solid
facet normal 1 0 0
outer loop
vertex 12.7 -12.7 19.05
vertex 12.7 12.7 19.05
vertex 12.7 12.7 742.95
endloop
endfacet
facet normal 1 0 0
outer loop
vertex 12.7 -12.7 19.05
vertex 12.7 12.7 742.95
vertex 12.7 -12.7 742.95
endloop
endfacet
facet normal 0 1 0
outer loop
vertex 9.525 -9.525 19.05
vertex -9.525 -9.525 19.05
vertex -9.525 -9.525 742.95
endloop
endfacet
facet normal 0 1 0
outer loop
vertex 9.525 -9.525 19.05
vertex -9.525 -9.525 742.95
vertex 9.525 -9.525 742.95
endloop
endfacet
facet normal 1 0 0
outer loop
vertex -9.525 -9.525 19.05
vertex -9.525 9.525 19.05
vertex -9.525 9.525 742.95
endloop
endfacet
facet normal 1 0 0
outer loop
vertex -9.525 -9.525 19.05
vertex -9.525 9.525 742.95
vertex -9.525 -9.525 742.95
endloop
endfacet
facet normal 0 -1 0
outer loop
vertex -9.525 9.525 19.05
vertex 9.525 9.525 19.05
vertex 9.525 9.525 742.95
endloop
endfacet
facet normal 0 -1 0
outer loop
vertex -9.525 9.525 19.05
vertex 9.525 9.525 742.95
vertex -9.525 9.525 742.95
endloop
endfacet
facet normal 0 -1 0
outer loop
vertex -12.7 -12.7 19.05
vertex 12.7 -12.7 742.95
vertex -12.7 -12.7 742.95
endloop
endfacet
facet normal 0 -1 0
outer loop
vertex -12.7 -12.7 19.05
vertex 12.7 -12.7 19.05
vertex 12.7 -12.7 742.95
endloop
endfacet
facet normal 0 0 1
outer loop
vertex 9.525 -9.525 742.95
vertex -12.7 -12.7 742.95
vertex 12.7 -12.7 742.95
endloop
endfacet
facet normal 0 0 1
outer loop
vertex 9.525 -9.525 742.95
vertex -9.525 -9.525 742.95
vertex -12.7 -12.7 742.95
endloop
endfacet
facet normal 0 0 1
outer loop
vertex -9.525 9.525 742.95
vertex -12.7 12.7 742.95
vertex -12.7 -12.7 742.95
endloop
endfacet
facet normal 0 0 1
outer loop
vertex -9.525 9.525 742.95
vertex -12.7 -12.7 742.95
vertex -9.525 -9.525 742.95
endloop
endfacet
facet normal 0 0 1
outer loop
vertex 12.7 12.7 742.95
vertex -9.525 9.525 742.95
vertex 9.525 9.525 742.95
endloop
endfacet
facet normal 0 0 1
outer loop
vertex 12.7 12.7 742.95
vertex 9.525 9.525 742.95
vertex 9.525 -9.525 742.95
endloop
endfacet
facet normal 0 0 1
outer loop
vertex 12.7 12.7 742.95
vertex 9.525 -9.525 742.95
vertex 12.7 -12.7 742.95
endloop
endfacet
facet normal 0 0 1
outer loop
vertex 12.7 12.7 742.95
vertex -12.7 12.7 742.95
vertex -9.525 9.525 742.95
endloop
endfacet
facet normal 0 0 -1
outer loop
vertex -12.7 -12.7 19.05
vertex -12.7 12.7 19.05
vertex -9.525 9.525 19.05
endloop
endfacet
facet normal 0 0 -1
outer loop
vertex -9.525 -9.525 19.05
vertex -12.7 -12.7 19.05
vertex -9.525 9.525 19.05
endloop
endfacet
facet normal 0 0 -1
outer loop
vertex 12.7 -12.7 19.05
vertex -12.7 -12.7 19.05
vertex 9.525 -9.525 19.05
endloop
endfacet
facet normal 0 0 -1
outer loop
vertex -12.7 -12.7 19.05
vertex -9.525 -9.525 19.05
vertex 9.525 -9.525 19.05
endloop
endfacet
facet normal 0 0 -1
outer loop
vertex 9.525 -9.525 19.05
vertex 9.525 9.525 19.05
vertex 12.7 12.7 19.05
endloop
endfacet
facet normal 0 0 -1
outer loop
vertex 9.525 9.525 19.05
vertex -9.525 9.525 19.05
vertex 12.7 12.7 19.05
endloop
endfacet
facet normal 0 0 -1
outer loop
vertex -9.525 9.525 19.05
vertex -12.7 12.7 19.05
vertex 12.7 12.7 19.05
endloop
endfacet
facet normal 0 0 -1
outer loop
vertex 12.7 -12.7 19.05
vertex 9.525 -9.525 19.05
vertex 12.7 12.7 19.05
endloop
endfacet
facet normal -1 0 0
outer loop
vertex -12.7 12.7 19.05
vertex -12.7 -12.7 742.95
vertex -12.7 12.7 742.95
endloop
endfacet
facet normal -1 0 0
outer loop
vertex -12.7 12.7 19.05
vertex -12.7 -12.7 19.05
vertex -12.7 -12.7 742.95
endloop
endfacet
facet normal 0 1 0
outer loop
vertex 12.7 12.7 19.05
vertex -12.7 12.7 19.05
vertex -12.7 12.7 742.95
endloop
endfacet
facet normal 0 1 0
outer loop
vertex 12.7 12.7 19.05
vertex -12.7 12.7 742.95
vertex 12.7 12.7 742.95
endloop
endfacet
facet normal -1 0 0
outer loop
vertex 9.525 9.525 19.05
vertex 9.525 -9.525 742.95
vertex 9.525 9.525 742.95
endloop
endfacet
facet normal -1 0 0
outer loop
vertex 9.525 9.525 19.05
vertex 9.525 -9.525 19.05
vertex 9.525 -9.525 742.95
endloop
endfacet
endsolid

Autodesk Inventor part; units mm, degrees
ref_plane "Start Plane" through (0, 0, 19.05) normal (0, 0, 1) x (1, 0, 0)
ref_plane "End Plane" through (0, 0, 742.95) normal (0, 0, 1) x (1, 0, 0)
sketch "Sketch" plane through (0, 0, 0) normal (0, 0, 1) x (1, 0, 0)
  line L0 (-12.7, 12.7) -> (12.7, 12.7)
  line L1 (12.7, 12.7) -> (12.7, -12.7)
  line L2 (12.7, -12.7) -> (-12.7, -12.7)
  line L3 (-12.7, -12.7) -> (-12.7, 12.7)
  line L4 (9.525, 9.525) -> (-9.525, 9.525)
  line L5 (-9.525, 9.525) -> (-9.525, -9.525)
  line L6 (-9.525, -9.525) -> (9.525, -9.525)
  line L7 (9.525, -9.525) -> (9.525, 9.525)
  point P0 (0, 0)
  point P1 (0, 12.7)
  point P2 (-12.7, 0)
  dimension "width" = 25.4
  dimension "d1" = 3.175
extrude "Body" add sketch "Sketch" along normal up to surface (723.9 mm away) from surface at 19.05
sketch "Sketch4" plane through (0, 0, 0) normal (0, 0, 1) x (1, 0, 0)
  line L0 (0, 0) -> (10, 0)
ref_plane "Work Plane4" through (0, 0, 0) normal (0, -1, 0) x (1, 0, 0)
sketch "Sketch5" plane through (0, 0, 0) normal (0, -1, 0) x (1, 0, 0)
  line L0 (-2, 19.05) -> (12, 19.05)
  line L1 (-2, 742.95) -> (12, 742.95)
  dimension "d9" = 723.9
ref_plane "Work Plane5" through (19.05, 76.2, 742.95) normal (0, 0, 1) x (1, 0, 0)
split "Split1" plane through (19.05, 76.2, 742.95) removes the side toward (0, 0, 1)
ref_plane "Work Plane6" through (-19.05, 76.2, 19.05) normal (0, 0, -1) x (-1, 0, 0)
split "Split2" plane through (-19.05, 76.2, 19.05) removes the side toward (0, 0, -1)
equation "\"G_OFFSET_START\" = -19.05"
equation "\"G_OFFSET_END\" = -19.05"
equation "\"d4\" = -G_OFFSET_START"
equation "\"d5\" = length + G_OFFSET_END"
equation "\"G_L\" = 762"
equation "\"length\" = 762"
properties part number "Square Tube Profile" material "Aluminum-6061"
